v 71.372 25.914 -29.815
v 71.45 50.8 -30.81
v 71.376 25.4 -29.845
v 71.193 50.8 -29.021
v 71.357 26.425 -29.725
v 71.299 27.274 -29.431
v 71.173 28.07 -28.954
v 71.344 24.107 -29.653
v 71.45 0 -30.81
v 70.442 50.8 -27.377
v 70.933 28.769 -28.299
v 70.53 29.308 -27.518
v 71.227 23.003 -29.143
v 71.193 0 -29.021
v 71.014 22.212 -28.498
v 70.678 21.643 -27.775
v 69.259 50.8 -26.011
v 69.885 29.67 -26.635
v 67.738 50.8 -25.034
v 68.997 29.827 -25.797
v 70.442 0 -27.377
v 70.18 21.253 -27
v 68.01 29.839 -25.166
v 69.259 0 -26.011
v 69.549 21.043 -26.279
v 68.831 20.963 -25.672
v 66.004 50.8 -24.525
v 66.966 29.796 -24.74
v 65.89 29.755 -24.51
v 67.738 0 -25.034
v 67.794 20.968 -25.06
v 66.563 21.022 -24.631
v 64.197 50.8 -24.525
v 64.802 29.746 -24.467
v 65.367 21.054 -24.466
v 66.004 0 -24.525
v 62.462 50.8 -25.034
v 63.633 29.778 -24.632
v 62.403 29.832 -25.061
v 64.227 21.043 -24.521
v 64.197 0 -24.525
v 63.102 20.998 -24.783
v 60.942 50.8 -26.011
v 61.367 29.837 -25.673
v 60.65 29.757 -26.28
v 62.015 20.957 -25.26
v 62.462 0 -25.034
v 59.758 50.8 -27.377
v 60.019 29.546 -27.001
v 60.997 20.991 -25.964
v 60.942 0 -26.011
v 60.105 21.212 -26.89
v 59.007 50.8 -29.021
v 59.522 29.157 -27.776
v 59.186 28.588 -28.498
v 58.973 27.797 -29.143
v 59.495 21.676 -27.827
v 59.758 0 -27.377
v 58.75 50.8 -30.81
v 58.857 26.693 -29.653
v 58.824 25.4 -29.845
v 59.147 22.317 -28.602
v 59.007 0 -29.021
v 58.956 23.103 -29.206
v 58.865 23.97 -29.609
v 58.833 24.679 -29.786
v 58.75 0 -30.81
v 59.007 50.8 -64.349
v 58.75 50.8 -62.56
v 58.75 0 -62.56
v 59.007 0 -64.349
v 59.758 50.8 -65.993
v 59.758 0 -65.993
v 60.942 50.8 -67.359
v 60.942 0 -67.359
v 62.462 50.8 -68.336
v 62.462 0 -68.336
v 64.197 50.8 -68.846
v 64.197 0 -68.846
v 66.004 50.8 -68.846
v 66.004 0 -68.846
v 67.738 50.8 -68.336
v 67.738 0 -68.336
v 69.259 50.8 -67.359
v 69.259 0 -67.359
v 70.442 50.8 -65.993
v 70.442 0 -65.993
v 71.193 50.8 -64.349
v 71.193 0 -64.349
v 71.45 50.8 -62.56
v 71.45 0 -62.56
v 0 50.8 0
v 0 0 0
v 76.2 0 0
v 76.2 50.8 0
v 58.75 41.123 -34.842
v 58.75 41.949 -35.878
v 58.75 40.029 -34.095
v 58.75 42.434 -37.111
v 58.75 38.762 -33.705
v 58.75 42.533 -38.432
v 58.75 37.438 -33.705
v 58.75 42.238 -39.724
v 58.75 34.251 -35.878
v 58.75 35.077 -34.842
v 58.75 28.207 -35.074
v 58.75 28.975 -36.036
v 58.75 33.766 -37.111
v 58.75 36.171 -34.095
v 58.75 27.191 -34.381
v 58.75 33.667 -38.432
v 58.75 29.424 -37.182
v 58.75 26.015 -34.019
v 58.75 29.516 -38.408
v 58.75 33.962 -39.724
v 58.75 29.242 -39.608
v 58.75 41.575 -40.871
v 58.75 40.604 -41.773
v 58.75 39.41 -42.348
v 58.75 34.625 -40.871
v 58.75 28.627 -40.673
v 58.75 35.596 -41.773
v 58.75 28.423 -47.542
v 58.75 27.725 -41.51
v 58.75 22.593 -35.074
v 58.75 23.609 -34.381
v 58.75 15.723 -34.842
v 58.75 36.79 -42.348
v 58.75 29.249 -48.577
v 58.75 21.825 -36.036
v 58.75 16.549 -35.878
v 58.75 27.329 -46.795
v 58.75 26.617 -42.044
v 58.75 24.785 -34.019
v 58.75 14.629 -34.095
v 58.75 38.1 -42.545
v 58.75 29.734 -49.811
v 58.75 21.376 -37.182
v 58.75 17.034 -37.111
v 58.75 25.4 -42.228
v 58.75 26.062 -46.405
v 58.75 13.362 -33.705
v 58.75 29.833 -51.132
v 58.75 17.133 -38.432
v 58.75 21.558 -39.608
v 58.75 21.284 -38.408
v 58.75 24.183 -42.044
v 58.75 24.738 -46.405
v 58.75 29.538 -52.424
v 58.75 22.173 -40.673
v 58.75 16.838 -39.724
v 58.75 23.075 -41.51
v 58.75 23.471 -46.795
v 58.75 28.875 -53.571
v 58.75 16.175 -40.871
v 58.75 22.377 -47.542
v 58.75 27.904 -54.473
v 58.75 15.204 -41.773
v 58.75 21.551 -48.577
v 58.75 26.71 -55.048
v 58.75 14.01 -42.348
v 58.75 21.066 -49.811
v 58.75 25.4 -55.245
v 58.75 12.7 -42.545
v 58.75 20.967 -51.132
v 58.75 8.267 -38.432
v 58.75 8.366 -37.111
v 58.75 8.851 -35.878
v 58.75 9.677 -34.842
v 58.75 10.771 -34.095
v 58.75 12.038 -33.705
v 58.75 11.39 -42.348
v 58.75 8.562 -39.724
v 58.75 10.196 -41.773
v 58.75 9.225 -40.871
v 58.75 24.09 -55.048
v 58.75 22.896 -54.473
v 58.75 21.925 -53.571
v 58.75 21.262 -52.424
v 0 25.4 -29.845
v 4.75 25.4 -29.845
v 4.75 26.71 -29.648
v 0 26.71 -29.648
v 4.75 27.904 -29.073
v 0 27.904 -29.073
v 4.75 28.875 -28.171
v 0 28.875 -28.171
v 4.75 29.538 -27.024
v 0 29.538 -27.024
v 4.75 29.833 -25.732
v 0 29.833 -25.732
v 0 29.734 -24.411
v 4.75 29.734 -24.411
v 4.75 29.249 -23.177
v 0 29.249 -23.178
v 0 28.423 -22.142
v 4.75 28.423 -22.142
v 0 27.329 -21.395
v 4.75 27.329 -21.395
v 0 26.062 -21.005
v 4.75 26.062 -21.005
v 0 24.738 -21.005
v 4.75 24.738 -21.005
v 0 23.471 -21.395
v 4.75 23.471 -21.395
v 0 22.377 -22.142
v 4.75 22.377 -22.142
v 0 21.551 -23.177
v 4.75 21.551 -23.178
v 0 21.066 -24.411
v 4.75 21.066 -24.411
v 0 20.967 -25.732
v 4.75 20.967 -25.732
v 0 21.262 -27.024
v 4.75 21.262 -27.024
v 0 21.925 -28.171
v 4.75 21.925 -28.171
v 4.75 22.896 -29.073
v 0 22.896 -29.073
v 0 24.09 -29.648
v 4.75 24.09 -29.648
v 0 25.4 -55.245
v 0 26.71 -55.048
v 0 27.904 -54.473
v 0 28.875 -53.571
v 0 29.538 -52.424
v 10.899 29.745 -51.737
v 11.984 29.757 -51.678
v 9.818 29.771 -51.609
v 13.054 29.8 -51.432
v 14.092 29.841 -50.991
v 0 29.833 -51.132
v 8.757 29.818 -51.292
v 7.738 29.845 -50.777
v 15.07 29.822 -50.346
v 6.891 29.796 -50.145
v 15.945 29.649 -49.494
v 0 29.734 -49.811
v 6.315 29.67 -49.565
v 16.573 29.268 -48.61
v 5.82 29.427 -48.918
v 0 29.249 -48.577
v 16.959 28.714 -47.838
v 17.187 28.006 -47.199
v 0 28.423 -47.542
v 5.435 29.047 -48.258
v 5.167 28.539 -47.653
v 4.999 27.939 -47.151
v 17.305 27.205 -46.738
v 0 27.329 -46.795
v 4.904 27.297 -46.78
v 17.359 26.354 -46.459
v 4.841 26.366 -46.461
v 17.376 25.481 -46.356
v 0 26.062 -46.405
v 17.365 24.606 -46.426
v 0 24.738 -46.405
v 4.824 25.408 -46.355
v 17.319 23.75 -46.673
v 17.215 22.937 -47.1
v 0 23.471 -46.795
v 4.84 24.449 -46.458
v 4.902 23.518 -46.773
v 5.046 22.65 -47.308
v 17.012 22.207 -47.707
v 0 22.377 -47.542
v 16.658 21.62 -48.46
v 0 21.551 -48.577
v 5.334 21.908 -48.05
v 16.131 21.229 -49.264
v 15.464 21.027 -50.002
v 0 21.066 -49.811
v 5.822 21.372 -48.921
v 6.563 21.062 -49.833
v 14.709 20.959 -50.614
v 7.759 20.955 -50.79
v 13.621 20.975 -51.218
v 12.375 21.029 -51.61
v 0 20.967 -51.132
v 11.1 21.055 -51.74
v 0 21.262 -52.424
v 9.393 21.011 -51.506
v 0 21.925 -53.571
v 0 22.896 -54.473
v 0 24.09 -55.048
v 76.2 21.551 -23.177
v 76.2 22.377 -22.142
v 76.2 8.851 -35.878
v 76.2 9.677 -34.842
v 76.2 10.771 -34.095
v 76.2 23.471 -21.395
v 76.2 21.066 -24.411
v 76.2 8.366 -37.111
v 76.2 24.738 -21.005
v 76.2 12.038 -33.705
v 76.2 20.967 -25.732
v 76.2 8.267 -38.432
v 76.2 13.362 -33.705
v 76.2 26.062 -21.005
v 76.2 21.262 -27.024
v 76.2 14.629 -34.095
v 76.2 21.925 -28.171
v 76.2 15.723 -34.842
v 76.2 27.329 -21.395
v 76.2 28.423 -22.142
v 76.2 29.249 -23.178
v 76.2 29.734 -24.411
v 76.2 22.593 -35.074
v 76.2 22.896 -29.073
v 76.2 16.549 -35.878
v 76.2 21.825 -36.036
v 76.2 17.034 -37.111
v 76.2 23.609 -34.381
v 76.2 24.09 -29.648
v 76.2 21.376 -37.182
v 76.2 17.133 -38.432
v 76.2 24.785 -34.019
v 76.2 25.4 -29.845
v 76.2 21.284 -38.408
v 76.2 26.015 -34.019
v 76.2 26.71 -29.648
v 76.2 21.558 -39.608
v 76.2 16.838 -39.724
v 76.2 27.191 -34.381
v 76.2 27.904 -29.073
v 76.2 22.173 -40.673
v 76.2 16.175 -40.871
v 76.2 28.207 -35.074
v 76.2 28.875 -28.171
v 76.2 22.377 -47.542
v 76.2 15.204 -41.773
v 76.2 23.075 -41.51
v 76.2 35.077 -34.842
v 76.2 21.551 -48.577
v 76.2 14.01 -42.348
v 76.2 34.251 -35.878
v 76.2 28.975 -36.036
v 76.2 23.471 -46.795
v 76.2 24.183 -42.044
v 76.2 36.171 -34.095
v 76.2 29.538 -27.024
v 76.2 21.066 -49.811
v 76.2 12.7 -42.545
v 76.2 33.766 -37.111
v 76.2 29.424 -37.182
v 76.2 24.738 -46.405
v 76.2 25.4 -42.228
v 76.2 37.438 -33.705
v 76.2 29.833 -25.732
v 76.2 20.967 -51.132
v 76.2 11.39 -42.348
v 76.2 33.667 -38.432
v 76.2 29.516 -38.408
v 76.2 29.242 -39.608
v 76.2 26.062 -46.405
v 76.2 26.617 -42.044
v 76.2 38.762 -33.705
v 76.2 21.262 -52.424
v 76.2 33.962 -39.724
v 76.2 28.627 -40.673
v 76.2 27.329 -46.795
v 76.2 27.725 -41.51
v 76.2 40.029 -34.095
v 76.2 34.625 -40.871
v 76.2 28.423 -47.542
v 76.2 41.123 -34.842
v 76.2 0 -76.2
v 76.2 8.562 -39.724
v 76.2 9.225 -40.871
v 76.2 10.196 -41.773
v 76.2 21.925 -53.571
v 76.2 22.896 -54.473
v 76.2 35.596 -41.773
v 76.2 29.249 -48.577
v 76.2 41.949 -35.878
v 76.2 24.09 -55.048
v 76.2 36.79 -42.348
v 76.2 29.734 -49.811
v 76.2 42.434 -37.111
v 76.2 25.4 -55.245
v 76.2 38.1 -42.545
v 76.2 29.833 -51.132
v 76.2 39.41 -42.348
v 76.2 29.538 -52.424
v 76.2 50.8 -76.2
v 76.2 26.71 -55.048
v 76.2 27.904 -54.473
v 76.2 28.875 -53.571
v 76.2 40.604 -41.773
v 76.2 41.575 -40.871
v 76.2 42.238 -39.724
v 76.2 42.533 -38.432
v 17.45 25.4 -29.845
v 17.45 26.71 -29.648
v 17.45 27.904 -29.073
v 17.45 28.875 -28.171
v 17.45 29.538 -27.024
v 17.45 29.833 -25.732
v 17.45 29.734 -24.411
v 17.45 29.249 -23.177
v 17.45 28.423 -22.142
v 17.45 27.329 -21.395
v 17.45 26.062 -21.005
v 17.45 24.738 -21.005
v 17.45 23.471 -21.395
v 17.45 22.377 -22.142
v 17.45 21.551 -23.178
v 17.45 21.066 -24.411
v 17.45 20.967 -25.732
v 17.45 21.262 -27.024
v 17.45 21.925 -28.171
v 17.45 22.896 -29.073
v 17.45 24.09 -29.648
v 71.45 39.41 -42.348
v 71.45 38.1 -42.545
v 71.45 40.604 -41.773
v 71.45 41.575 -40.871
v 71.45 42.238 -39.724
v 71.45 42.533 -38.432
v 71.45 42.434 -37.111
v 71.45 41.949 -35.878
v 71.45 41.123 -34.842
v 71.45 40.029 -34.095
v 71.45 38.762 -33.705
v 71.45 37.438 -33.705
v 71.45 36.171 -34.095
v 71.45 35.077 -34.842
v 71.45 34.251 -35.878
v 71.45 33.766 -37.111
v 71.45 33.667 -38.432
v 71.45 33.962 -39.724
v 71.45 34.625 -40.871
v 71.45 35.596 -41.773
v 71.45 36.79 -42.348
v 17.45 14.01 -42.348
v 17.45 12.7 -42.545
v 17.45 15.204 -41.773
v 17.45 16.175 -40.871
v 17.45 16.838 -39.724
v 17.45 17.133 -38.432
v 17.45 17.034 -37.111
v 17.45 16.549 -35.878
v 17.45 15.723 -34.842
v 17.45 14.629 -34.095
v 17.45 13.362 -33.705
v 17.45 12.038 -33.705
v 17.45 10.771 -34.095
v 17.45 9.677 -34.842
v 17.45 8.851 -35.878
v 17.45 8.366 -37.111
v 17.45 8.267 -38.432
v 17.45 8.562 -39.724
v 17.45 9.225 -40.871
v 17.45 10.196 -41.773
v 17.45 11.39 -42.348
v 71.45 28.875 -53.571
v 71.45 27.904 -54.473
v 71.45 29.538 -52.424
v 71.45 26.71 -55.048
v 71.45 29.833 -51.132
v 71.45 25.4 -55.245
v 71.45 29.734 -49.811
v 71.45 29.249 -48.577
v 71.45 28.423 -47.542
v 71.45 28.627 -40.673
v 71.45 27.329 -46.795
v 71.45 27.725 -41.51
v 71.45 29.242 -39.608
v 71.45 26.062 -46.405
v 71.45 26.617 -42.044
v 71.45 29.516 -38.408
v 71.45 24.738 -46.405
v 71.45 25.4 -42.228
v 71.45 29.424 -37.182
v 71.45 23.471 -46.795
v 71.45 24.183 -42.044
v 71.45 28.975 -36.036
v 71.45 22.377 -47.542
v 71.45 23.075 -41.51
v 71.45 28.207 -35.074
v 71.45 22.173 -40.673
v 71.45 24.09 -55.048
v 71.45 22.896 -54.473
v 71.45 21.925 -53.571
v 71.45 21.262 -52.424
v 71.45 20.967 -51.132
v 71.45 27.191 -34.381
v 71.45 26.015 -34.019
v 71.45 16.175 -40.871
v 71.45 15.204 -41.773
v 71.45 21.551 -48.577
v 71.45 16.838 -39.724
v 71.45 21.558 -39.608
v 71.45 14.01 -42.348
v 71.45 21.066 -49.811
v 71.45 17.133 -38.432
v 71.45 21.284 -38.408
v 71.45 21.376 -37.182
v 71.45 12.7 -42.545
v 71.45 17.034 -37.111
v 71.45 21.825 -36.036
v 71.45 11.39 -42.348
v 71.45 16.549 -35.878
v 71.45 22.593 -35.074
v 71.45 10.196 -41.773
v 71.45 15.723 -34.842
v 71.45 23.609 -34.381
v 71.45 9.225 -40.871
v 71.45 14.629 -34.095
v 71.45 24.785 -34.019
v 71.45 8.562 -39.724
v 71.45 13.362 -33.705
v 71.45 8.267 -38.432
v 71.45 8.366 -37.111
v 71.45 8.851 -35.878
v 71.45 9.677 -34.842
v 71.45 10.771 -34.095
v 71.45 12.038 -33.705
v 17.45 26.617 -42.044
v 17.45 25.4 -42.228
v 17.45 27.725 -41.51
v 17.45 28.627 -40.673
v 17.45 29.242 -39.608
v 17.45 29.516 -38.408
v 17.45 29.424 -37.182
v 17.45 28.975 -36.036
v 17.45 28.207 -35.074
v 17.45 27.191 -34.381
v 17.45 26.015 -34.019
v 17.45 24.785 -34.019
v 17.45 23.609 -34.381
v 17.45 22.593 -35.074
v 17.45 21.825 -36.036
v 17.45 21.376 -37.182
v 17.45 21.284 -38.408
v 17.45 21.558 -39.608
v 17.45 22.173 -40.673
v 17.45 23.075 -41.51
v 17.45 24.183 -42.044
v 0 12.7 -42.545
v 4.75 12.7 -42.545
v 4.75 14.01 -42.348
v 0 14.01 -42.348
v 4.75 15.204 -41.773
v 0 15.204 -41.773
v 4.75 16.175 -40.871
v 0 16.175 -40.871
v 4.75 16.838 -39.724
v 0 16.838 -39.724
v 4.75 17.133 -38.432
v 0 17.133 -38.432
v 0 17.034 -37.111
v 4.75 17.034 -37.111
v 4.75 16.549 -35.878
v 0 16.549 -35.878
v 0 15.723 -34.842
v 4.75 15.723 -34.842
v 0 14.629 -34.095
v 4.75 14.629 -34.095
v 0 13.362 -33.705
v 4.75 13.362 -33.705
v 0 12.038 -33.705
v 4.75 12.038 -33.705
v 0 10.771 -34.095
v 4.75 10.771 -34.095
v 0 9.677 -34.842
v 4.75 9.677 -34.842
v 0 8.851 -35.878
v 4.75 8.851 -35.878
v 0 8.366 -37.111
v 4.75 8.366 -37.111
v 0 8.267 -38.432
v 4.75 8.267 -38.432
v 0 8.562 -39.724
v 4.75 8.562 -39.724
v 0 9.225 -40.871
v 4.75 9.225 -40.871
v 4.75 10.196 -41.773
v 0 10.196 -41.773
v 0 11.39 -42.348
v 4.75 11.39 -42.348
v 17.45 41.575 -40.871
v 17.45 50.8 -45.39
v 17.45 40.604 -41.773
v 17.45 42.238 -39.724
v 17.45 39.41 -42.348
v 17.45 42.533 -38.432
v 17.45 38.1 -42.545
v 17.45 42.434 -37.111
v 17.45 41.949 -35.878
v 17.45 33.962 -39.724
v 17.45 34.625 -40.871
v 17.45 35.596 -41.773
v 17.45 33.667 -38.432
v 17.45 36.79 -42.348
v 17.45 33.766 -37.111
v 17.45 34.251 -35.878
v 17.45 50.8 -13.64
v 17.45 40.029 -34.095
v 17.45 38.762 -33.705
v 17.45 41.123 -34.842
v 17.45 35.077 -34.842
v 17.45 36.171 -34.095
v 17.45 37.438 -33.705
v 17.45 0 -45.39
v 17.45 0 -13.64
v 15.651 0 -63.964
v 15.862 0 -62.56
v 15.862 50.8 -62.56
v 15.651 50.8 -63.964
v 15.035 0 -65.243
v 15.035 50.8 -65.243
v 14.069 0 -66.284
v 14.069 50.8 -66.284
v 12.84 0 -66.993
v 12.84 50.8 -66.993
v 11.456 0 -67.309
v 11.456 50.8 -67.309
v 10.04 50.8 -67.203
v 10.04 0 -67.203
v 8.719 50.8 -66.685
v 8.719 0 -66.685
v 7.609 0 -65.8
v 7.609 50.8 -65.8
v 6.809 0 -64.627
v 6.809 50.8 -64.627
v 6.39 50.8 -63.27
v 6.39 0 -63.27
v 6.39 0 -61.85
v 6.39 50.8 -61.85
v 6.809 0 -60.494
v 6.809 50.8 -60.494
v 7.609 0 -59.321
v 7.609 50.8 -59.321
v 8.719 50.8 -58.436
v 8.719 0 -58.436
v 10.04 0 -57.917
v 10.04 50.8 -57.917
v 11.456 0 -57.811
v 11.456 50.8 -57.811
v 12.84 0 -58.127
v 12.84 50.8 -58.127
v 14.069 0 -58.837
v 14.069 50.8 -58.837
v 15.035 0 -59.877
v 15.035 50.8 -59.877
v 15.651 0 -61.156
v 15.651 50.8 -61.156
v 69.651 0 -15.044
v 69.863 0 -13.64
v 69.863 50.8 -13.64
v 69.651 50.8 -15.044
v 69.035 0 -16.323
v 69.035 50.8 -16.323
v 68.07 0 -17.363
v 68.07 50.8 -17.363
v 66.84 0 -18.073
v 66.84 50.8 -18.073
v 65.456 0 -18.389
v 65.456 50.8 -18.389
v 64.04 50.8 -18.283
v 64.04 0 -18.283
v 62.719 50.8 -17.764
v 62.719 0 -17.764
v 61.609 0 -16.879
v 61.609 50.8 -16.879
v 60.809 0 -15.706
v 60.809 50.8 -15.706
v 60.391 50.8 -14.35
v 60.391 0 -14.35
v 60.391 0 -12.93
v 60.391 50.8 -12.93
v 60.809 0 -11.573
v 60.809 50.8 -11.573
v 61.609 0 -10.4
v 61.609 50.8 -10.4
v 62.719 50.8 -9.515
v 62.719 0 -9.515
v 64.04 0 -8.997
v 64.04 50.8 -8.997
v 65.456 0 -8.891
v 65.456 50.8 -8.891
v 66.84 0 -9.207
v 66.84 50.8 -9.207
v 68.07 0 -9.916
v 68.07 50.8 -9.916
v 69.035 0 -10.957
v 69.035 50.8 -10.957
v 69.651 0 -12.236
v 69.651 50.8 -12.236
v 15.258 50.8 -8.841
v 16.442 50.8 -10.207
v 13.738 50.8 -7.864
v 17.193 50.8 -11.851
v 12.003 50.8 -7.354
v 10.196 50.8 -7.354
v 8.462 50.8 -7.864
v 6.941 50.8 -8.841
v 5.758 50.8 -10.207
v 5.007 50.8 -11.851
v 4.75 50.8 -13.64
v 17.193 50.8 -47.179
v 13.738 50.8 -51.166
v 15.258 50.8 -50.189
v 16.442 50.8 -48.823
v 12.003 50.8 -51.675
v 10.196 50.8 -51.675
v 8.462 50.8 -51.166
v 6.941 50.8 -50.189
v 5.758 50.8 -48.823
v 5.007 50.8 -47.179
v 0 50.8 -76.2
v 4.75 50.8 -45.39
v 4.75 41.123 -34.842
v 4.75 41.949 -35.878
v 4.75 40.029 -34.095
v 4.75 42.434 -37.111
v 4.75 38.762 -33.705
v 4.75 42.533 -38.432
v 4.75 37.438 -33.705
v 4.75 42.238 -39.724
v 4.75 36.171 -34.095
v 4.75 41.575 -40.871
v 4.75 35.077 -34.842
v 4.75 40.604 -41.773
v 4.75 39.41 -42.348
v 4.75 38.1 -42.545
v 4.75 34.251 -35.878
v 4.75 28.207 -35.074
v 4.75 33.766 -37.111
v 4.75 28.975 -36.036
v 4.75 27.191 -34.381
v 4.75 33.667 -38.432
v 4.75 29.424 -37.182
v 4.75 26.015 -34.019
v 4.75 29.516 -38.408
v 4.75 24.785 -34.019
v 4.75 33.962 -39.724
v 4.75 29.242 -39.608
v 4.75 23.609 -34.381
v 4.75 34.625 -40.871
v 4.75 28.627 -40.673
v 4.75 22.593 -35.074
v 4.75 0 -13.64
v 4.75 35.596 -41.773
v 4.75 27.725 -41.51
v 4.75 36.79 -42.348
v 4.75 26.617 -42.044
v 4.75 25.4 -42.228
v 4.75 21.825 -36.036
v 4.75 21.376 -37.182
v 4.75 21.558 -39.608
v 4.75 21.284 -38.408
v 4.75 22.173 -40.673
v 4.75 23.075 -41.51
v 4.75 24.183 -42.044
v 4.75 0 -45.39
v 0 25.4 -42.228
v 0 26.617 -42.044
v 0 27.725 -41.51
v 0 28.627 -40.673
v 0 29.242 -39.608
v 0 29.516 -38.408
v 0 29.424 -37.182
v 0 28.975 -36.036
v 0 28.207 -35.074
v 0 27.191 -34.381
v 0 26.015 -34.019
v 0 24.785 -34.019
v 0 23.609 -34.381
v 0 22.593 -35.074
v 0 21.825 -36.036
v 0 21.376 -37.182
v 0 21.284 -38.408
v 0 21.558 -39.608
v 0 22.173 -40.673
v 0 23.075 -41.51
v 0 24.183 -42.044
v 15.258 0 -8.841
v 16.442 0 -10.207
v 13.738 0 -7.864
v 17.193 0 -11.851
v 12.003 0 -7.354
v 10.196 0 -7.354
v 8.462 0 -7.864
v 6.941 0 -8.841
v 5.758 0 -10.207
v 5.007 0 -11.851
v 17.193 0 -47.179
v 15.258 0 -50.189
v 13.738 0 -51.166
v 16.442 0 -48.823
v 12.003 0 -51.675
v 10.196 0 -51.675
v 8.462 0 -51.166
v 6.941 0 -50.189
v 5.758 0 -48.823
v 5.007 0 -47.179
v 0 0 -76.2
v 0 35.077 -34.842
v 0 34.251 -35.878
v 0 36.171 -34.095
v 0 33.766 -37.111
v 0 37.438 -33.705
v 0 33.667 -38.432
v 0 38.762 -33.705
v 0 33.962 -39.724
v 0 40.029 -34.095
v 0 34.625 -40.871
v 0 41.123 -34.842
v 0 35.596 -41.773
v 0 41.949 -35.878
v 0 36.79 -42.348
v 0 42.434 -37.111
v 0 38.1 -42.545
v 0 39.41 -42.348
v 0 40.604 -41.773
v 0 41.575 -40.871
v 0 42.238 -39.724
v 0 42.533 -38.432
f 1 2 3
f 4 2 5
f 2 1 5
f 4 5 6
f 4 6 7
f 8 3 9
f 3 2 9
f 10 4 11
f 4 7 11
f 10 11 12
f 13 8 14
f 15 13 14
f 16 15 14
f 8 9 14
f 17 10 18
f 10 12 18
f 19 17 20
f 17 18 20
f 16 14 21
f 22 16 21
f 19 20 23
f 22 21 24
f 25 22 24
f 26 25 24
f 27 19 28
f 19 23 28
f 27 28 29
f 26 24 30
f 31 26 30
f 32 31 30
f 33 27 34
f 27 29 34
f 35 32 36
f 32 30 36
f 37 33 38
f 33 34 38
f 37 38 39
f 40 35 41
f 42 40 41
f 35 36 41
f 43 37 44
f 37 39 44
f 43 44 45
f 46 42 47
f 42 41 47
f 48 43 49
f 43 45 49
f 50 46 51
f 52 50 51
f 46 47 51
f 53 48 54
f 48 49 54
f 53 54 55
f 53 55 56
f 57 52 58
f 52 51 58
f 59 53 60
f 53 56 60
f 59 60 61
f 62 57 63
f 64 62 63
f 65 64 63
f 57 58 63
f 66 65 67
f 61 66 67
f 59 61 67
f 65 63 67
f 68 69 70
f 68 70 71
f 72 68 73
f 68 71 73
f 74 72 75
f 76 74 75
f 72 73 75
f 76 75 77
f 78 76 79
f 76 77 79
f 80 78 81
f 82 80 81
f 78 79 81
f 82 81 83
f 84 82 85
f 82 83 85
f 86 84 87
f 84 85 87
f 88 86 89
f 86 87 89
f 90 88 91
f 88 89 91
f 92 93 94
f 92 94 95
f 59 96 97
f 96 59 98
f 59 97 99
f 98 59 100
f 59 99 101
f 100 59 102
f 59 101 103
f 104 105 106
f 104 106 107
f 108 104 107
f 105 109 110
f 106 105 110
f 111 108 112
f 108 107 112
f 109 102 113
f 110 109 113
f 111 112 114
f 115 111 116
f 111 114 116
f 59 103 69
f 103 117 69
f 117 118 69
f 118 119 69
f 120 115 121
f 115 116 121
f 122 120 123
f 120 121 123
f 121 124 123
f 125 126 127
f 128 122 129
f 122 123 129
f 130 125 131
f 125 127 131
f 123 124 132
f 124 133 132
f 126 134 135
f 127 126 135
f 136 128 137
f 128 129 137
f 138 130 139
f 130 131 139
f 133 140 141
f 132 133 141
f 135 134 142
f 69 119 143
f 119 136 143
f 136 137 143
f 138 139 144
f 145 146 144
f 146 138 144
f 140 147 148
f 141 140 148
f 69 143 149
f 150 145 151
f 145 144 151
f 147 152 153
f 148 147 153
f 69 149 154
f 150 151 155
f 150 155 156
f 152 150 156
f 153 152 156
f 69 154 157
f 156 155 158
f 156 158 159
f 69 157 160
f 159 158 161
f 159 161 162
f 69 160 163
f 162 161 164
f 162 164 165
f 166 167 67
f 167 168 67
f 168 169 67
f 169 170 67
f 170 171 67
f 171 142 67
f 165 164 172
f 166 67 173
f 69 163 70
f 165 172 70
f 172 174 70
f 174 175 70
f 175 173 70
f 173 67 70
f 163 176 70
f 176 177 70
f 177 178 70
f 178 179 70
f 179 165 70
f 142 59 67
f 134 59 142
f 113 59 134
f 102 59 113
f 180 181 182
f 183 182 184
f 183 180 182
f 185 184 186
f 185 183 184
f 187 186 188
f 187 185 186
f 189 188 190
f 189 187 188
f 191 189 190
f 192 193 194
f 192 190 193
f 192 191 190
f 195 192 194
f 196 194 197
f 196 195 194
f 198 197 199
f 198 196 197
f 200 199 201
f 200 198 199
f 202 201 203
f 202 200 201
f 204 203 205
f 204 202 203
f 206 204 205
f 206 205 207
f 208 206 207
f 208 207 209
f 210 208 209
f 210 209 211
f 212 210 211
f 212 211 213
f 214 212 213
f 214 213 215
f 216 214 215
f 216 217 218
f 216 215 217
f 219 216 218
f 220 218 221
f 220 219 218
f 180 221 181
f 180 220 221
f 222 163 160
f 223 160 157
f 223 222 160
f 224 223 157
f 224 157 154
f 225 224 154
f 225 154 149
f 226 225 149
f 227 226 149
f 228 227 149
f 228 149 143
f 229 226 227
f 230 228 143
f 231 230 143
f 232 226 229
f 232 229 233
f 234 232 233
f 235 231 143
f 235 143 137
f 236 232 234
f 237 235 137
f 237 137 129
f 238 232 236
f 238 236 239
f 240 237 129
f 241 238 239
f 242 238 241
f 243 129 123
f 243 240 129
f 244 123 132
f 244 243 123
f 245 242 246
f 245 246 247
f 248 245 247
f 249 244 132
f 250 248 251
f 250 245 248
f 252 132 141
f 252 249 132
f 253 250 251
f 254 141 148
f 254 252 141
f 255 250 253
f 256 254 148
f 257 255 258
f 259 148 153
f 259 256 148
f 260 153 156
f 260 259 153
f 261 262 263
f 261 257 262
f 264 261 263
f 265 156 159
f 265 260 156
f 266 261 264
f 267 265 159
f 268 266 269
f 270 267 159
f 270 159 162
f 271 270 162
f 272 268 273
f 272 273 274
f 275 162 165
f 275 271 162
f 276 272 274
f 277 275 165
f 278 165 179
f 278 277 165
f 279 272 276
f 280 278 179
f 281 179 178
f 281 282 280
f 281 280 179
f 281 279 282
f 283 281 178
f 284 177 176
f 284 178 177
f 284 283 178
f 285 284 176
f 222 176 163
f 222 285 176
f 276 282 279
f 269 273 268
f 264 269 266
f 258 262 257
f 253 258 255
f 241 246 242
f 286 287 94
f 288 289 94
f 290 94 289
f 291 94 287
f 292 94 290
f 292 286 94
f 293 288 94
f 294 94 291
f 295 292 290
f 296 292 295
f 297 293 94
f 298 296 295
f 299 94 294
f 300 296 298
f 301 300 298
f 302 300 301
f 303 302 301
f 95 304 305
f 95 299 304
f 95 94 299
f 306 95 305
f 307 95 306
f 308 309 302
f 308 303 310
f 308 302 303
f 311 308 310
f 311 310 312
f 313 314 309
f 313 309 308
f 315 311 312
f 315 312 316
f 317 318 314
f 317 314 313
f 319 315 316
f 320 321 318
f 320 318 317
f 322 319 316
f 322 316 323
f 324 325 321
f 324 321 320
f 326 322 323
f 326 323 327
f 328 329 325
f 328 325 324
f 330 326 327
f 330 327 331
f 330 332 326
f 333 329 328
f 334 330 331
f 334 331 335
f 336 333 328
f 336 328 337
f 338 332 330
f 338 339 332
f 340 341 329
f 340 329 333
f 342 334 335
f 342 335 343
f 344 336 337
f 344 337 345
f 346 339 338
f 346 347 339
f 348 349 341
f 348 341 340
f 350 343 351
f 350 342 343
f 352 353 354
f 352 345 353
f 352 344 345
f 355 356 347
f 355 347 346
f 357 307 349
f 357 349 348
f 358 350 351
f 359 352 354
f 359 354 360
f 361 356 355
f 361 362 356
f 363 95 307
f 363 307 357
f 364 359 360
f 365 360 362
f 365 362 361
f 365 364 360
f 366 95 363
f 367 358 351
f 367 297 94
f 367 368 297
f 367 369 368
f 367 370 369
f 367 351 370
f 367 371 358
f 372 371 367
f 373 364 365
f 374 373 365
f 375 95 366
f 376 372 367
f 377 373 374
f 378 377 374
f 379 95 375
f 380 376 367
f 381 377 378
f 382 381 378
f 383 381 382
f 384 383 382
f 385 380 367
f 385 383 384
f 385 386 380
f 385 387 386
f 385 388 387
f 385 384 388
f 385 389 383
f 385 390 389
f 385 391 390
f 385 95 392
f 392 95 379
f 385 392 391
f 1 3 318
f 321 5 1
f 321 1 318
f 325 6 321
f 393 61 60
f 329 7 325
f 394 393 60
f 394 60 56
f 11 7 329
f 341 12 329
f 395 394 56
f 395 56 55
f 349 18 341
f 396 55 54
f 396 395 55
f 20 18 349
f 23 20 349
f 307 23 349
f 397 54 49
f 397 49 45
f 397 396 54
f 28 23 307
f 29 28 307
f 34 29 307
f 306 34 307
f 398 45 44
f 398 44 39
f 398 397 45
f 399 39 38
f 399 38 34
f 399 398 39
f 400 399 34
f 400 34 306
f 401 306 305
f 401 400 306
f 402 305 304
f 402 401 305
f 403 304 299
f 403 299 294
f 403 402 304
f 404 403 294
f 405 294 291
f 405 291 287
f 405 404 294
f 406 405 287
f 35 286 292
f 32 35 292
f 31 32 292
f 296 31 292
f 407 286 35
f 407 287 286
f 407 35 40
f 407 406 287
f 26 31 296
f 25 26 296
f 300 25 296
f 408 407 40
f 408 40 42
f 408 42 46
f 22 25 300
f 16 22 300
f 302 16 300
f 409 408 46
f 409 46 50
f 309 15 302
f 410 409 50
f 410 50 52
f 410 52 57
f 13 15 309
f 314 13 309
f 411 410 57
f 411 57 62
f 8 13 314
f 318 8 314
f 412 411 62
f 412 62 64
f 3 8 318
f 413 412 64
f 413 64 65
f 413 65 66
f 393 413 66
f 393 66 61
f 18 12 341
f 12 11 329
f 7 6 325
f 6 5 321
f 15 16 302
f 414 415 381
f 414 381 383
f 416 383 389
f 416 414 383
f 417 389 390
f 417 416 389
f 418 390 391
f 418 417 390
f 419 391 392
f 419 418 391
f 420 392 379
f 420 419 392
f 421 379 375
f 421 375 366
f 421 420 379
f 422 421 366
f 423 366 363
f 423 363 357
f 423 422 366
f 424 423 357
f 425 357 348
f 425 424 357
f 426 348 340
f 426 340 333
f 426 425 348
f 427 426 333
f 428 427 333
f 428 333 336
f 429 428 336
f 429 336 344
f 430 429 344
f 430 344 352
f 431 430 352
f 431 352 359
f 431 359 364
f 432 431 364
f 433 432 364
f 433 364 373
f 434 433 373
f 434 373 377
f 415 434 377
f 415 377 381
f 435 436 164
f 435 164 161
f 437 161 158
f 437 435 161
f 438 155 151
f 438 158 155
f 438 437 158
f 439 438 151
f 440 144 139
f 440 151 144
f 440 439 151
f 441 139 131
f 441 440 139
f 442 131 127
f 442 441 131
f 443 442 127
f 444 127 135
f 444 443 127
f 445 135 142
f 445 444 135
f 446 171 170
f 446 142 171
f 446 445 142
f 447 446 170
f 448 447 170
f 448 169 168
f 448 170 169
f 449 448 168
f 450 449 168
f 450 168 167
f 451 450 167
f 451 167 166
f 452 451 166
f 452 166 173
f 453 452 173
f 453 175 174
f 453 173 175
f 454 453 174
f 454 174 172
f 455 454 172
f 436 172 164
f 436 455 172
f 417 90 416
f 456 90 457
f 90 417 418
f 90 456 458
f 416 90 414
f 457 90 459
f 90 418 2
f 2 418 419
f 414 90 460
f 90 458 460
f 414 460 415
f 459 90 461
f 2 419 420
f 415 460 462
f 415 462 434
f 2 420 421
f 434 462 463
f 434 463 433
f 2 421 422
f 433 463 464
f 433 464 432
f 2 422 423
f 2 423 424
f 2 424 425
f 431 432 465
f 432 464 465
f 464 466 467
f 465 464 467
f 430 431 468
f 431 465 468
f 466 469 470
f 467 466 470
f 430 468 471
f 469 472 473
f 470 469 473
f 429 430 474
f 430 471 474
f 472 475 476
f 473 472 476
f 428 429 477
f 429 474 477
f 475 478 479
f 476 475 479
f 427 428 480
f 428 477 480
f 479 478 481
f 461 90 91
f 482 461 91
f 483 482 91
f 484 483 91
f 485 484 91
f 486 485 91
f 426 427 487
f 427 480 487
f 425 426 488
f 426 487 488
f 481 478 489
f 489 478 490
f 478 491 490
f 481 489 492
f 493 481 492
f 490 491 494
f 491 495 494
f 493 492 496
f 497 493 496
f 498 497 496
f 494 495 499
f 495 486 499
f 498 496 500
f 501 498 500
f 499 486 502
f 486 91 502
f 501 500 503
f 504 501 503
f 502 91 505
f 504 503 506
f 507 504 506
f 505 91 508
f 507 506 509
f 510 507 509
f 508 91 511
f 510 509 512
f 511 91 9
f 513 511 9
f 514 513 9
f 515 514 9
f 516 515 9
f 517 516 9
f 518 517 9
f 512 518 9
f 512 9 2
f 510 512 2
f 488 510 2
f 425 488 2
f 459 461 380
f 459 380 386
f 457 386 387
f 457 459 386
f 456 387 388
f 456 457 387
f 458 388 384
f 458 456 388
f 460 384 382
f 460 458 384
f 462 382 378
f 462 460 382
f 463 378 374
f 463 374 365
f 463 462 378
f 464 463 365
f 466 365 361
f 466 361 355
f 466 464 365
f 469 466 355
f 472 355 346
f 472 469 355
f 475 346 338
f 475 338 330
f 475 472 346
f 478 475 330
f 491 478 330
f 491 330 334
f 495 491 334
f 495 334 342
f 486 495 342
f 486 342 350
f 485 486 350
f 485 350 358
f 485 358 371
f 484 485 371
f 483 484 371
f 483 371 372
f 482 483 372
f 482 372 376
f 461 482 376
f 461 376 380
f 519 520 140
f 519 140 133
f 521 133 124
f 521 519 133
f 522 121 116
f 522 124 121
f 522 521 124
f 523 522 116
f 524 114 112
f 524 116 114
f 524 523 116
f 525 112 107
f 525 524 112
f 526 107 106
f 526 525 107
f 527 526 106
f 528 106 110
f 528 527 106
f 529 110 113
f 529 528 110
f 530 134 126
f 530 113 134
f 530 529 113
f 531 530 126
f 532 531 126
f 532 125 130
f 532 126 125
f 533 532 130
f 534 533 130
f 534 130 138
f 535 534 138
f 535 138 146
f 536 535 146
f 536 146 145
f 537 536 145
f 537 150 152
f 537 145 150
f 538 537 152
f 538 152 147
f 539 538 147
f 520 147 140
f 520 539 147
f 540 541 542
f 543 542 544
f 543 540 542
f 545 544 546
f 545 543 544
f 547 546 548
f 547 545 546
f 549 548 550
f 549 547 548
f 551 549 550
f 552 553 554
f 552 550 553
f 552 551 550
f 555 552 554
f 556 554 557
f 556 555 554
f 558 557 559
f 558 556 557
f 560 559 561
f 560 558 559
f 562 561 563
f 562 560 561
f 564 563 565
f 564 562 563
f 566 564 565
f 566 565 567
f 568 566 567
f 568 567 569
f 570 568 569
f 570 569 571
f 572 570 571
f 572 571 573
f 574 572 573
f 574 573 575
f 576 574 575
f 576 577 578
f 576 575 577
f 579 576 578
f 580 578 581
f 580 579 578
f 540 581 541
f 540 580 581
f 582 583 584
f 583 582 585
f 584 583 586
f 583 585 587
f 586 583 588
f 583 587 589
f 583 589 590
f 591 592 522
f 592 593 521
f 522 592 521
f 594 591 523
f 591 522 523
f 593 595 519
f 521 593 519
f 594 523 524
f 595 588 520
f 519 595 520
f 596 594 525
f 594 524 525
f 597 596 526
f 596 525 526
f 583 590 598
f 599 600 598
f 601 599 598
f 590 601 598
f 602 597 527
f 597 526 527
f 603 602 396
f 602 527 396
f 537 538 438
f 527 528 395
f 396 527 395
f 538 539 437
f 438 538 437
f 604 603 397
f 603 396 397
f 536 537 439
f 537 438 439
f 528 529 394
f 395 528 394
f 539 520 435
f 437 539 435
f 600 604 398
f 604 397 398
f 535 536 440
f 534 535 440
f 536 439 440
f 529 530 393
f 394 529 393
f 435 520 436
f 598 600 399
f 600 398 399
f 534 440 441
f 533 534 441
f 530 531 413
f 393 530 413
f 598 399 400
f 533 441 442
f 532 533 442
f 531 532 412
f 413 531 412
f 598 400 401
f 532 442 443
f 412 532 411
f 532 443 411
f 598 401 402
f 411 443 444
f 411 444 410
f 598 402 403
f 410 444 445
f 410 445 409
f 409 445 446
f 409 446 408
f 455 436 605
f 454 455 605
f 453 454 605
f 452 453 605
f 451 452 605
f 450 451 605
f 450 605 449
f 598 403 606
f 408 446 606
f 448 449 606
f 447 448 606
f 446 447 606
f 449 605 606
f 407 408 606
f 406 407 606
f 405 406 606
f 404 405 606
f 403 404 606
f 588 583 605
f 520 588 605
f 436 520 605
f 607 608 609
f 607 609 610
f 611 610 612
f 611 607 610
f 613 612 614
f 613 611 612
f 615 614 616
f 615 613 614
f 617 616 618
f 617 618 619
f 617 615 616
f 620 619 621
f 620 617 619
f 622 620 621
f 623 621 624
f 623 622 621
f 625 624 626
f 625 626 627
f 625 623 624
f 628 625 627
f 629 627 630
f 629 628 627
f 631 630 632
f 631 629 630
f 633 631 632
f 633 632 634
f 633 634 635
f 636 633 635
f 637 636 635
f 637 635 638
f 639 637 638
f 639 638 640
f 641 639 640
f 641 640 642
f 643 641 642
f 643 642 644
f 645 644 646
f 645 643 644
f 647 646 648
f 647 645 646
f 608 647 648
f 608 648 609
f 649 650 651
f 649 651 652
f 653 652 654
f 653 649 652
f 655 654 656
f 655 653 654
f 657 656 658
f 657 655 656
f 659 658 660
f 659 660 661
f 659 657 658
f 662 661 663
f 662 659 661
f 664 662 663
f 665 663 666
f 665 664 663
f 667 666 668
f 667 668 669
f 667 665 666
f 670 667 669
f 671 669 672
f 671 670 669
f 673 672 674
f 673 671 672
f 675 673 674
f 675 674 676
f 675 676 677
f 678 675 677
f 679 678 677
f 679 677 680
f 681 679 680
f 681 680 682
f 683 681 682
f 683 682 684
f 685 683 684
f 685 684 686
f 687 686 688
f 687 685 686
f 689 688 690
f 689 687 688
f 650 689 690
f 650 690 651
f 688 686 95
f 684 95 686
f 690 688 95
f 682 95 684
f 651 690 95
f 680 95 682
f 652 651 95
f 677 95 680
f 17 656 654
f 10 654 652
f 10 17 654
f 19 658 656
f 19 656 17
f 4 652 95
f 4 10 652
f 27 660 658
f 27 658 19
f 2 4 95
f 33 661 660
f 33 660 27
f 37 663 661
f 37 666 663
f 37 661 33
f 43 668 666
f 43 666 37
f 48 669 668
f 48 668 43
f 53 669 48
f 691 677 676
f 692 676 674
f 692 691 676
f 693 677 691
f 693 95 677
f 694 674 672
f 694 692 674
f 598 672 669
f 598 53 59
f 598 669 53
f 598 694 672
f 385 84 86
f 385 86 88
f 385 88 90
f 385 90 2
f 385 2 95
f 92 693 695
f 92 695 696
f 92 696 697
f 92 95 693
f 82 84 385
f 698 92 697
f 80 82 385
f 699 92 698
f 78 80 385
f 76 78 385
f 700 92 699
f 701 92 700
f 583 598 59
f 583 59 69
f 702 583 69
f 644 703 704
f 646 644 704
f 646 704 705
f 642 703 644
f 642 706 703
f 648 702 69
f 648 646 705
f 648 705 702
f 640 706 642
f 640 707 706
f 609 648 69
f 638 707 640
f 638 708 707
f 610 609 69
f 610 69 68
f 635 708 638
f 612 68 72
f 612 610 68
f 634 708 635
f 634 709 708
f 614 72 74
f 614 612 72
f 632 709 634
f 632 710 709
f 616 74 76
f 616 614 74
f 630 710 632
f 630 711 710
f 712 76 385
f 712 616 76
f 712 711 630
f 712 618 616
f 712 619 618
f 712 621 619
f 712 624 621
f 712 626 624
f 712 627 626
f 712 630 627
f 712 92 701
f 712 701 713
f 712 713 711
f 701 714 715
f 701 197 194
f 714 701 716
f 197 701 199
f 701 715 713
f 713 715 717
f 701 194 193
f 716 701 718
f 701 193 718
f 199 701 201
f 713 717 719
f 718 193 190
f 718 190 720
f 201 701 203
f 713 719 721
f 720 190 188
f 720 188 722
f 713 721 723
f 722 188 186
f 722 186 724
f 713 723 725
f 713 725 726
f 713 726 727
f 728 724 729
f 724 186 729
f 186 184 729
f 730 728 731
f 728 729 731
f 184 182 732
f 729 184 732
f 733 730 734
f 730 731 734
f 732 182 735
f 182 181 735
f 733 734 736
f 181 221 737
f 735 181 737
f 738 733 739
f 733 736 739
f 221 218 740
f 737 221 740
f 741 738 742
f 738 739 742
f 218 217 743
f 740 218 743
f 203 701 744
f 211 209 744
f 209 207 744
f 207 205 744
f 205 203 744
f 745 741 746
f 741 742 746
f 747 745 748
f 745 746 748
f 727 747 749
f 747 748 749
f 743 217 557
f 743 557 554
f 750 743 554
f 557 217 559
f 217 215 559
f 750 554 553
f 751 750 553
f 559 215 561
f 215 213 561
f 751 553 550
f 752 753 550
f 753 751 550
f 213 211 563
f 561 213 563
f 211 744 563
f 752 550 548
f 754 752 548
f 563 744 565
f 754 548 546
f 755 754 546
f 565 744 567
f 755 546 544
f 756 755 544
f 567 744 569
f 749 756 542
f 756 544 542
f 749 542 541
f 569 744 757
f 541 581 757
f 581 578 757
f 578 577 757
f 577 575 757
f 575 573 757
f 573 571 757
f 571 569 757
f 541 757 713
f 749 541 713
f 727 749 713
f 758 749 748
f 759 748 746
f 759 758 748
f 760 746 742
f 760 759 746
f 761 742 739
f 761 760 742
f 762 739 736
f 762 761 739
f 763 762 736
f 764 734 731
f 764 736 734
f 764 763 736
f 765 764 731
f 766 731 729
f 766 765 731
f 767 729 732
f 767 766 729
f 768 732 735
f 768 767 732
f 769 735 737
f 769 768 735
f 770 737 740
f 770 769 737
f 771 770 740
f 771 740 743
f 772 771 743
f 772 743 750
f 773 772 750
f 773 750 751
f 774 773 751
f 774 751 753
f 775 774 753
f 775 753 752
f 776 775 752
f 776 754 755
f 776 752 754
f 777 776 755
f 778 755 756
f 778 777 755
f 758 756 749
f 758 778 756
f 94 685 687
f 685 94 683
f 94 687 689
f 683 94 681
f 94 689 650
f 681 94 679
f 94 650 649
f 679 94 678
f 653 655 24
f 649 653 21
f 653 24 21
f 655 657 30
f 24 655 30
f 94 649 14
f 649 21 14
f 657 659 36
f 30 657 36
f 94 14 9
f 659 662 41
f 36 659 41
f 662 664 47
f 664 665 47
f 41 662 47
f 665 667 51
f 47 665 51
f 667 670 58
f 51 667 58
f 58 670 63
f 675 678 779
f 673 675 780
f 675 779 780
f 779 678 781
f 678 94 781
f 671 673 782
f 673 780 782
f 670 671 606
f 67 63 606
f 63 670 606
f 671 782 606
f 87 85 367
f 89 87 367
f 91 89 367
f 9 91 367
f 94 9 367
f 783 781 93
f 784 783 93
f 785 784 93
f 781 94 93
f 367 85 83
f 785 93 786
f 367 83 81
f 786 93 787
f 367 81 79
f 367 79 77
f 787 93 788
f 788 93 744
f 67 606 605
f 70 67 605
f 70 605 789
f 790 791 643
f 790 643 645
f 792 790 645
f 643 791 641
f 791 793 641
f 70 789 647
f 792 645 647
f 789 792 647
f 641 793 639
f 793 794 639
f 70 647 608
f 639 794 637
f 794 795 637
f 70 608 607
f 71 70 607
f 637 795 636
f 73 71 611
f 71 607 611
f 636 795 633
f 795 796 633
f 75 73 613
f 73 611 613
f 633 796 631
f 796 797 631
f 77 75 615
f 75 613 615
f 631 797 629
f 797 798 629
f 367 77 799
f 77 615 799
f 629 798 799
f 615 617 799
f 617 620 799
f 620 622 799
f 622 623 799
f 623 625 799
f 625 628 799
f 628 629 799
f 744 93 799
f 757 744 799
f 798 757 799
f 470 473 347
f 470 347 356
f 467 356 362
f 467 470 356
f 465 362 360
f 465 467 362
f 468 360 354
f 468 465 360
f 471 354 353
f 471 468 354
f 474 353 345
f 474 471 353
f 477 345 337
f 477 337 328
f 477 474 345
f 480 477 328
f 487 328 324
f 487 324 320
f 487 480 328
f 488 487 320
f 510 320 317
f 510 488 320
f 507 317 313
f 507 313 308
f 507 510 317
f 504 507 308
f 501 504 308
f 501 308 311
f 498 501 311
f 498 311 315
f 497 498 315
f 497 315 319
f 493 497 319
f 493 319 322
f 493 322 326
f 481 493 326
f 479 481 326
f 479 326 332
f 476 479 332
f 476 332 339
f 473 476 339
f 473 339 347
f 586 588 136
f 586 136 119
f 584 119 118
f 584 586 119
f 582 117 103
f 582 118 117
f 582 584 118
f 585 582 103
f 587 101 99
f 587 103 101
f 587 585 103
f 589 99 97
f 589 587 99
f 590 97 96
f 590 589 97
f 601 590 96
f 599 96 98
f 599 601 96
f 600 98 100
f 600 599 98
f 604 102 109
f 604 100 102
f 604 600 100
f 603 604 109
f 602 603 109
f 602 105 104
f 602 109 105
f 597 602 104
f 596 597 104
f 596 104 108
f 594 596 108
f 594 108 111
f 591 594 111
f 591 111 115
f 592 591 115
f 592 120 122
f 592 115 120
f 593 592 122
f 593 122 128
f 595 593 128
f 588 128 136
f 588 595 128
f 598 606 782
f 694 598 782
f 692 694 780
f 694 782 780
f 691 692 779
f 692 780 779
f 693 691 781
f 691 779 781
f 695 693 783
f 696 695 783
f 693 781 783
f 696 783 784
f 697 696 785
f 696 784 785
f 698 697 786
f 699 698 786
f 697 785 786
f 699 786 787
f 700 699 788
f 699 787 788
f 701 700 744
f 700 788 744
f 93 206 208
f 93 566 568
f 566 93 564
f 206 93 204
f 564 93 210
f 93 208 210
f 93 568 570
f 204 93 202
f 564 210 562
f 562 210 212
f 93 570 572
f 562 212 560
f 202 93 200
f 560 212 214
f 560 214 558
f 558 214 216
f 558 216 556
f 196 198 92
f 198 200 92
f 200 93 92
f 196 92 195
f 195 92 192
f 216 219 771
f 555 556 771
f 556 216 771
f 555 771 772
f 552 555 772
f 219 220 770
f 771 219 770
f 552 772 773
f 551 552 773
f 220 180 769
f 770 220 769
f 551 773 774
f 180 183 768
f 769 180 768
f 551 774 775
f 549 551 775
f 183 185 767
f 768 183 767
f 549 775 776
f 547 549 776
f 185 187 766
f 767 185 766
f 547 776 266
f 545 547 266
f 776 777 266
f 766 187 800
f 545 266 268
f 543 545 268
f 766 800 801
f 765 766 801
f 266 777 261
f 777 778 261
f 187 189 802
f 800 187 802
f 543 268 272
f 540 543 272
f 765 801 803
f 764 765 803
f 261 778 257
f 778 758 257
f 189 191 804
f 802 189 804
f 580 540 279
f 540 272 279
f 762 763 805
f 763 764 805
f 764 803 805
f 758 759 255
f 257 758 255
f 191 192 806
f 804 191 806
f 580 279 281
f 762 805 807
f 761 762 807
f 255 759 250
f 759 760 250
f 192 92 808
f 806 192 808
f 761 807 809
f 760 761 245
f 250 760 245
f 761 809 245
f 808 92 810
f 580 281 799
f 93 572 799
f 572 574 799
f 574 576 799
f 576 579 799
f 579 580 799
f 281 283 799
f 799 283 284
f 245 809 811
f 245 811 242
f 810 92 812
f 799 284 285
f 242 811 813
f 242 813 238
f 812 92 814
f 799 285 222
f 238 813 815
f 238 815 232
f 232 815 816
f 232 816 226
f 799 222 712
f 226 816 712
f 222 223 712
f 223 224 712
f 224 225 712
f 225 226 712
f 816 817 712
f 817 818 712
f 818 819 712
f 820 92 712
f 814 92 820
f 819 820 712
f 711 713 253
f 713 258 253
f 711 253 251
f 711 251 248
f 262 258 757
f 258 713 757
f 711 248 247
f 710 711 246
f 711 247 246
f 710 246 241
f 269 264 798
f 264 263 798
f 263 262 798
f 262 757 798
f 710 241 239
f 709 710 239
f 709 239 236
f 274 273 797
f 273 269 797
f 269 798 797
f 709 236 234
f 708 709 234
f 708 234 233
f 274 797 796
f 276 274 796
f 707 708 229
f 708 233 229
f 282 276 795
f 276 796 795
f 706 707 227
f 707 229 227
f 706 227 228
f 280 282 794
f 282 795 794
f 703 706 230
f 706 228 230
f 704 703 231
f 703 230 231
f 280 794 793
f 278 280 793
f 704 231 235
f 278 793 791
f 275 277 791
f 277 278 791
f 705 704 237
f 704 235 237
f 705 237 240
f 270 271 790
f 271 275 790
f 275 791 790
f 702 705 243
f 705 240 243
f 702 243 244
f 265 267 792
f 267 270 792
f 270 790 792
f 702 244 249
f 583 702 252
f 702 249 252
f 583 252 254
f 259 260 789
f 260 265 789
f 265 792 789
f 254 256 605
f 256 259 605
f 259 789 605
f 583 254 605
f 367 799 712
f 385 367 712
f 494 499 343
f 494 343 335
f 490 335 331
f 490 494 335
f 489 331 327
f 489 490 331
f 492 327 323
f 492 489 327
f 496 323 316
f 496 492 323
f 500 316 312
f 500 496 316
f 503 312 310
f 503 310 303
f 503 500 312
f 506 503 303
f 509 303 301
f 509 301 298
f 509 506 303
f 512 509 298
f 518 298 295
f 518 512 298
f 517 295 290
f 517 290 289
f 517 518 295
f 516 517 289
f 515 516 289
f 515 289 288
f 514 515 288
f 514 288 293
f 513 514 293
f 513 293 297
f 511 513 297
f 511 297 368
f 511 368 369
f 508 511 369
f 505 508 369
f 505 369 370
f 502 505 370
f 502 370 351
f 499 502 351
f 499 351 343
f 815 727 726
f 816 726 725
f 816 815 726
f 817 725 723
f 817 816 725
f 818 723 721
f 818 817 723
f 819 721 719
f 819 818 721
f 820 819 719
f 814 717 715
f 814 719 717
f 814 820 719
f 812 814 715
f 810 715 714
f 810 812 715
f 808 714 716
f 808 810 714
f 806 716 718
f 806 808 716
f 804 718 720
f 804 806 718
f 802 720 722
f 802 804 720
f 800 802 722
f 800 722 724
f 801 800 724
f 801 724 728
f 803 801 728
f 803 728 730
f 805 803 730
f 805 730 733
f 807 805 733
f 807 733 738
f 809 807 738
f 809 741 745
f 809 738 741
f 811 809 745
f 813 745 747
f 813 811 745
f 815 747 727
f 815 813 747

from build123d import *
from build123d.topology import SkipClean

# Parameters (mm, degrees)
SKETCH_1_W          = 76.2
SKETCH_1_H          = 50.8
SKETCH_1_R          = 4.1275
SKETCH_1_R_2        = 4.445
EXTRUDE_1_DEPTH     = 76.2
SKETCH_3_W          = 76.2
SKETCH_3_H          = 76.2
SKETCH_3_R          = 4.7625
EXTRUDE_2_DEPTH     = 50.8
SKETCH_1_4_R        = 4.1275
SKETCH_1_4_R_2      = 4.445
CUT_EXTRUDE_2_DEPTH = 76.2
SKETCH_10_R         = 4.7625
CUT_EXTRUDE_3_DEPTH = 50.8


with BuildPart() as part:
    # 草图1 → 凸台-拉伸1 (new body)
    with BuildSketch(Plane(origin=(0, 0, 0), x_dir=(0, 0, -1), z_dir=(1, 0, 0))):
        with Locations((38.1, 25.4)):
            Rectangle(SKETCH_1_W, SKETCH_1_H)
        with Locations((38.1, 25.4)):
            Circle(SKETCH_1_R, mode=Mode.SUBTRACT)
        with Locations((25.4, 25.4)):
            Circle(SKETCH_1_R_2, mode=Mode.SUBTRACT)
        with Locations((50.8, 25.4)):
            Circle(SKETCH_1_R_2, mode=Mode.SUBTRACT)
        with Locations((38.1, 38.1)):
            Circle(SKETCH_1_R_2, mode=Mode.SUBTRACT)
        with Locations((38.1, 12.7)):
            Circle(SKETCH_1_R_2, mode=Mode.SUBTRACT)
    extrude(amount=EXTRUDE_1_DEPTH)

    # 草图3 → 凸台-拉伸2 (add)
    with BuildSketch(Plane(origin=(0, 0, 0), x_dir=(1, 0, 0), z_dir=(0, 1, 0))):
        with Locations((38.1, 38.1)):
            Rectangle(SKETCH_3_W, SKETCH_3_H)
        with Locations((11.0998, 62.5602)):
            Circle(SKETCH_3_R, mode=Mode.SUBTRACT)
        with Locations((65.1002, 13.6398)):
            Circle(SKETCH_3_R, mode=Mode.SUBTRACT)
        with BuildLine():
            Line((17.4498, 45.3898), (17.4498, 13.6398))
            ThreePointArc((17.4498, 13.6398), (11.0998, 7.2898), (4.7498, 13.6398))
            Line((4.7498, 13.6398), (4.7498, 45.3898))
            ThreePointArc((4.7498, 45.3898), (11.0998, 51.7398), (17.4498, 45.3898))
        make_face(mode=Mode.SUBTRACT)
        with BuildLine():
            Line((58.7502, 30.8102), (58.7502, 62.5602))
            ThreePointArc((58.7502, 62.5602), (65.1002, 68.9102), (71.4502, 62.5602))
            Line((71.4502, 62.5602), (71.4502, 30.8102))
            ThreePointArc((71.4502, 30.8102), (65.1002, 24.4602), (58.7502, 30.8102))
        make_face(mode=Mode.SUBTRACT)
    extrude(amount=EXTRUDE_2_DEPTH)

    # 草图1<4> → 切除-拉伸2 (cut)
    with SkipClean():  # the faces are left unmerged after this step: merging them gives an invalid solid
        with BuildSketch(Plane(origin=(0, 0, 0), x_dir=(0, 0, -1), z_dir=(1, 0, 0))):
            with Locations((38.1, 25.4)):
                Circle(SKETCH_1_4_R)
            with Locations((25.4, 25.4)):
                Circle(SKETCH_1_4_R_2)
            with Locations((50.8, 25.4)):
                Circle(SKETCH_1_4_R_2)
            with Locations((38.1, 38.1)):
                Circle(SKETCH_1_4_R_2)
            with Locations((38.1, 12.7)):
                Circle(SKETCH_1_4_R_2)
        extrude(amount=CUT_EXTRUDE_2_DEPTH, mode=Mode.SUBTRACT)

    # 草图10 → 切除-拉伸3 (cut)
    with BuildSketch(Plane(origin=(0, 0, 0), x_dir=(1, 0, 0), z_dir=(0, 1, 0))):
        with Locations((11.0998, 62.5602)):
            Circle(SKETCH_10_R)
        with Locations((65.1002, 13.6398)):
            Circle(SKETCH_10_R)
        with BuildLine():
            Line((4.7498, 13.6398), (4.7498, 45.3898))
            ThreePointArc((4.7498, 45.3898), (11.0998, 51.7398), (17.4498, 45.3898))
            Line((17.4498, 45.3898), (17.4498, 13.6398))
            ThreePointArc((17.4498, 13.6398), (11.0998, 7.2898), (4.7498, 13.6398))
        make_face()
        with BuildLine():
            Line((71.4502, 62.5602), (71.4502, 30.8102))
            ThreePointArc((71.4502, 30.8102), (65.1002, 24.4602), (58.7502, 30.8102))
            Line((58.7502, 30.8102), (58.7502, 62.5602))
            ThreePointArc((58.7502, 62.5602), (65.1002, 68.9102), (71.4502, 62.5602))
        make_face()
    extrude(amount=CUT_EXTRUDE_3_DEPTH, mode=Mode.SUBTRACT)


solid = part.part
